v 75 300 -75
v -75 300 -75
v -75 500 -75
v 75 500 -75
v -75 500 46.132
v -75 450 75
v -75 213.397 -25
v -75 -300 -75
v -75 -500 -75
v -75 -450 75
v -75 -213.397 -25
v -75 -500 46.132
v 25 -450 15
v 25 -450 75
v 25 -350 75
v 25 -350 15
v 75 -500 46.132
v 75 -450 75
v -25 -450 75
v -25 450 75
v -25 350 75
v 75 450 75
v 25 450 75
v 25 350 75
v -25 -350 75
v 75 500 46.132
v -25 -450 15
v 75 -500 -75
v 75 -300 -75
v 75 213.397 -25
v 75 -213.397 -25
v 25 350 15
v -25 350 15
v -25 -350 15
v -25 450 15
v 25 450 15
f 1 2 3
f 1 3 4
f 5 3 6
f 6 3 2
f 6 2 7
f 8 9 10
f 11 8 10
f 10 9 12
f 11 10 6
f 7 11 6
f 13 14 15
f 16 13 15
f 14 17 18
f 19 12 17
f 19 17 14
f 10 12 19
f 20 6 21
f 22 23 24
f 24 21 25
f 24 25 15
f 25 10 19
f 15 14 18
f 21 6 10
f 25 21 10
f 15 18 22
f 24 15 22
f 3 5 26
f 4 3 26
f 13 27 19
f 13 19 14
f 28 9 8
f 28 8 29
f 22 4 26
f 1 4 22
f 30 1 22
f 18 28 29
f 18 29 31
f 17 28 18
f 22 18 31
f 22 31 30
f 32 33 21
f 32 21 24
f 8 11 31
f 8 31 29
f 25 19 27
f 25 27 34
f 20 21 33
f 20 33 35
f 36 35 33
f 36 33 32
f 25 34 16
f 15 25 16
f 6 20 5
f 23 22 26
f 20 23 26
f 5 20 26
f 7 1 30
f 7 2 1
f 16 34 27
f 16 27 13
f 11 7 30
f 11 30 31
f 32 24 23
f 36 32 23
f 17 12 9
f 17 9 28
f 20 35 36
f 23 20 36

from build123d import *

# Parameters (mm, degrees)
F3_W     = 150
F3_H     = 150
F4_DEPTH = 500
F6_DEPTH = 75
F7_W     = 50
F7_H     = 100
F8_DEPTH = 60


with BuildPart() as f4:
    # F3 (on Front) → F4 (new body, symmetric)
    with BuildSketch(Plane.XZ):
        Rectangle(F3_W, F3_H)
    extrude(amount=F4_DEPTH, both=True)

    # F5 (on Right) → F6 (cut, symmetric)
    with BuildSketch(Plane.YZ):
        Polygon((-500, 75), (-500, 46.1324865405), (-450, 75), align=None)
        Polygon((-213.3974596216, -25), (-300, -75), (0, -75), (300, -75), (213.3974596216, -25), (0, -25), align=None)
        Polygon((450, 75), (500, 46.1324865405), (500, 75), align=None)
    extrude(amount=F6_DEPTH, both=True, mode=Mode.SUBTRACT)

    # F7 (on face) → F8 (cut)
    with BuildSketch(Plane.XY.offset(75)):
        with Locations((0, 400)):
            Rectangle(F7_W, F7_H)
        with Locations((0, -400)):
            Rectangle(F7_W, F7_H)
    extrude(amount=-F8_DEPTH, mode=Mode.SUBTRACT)


solid = f4.part
